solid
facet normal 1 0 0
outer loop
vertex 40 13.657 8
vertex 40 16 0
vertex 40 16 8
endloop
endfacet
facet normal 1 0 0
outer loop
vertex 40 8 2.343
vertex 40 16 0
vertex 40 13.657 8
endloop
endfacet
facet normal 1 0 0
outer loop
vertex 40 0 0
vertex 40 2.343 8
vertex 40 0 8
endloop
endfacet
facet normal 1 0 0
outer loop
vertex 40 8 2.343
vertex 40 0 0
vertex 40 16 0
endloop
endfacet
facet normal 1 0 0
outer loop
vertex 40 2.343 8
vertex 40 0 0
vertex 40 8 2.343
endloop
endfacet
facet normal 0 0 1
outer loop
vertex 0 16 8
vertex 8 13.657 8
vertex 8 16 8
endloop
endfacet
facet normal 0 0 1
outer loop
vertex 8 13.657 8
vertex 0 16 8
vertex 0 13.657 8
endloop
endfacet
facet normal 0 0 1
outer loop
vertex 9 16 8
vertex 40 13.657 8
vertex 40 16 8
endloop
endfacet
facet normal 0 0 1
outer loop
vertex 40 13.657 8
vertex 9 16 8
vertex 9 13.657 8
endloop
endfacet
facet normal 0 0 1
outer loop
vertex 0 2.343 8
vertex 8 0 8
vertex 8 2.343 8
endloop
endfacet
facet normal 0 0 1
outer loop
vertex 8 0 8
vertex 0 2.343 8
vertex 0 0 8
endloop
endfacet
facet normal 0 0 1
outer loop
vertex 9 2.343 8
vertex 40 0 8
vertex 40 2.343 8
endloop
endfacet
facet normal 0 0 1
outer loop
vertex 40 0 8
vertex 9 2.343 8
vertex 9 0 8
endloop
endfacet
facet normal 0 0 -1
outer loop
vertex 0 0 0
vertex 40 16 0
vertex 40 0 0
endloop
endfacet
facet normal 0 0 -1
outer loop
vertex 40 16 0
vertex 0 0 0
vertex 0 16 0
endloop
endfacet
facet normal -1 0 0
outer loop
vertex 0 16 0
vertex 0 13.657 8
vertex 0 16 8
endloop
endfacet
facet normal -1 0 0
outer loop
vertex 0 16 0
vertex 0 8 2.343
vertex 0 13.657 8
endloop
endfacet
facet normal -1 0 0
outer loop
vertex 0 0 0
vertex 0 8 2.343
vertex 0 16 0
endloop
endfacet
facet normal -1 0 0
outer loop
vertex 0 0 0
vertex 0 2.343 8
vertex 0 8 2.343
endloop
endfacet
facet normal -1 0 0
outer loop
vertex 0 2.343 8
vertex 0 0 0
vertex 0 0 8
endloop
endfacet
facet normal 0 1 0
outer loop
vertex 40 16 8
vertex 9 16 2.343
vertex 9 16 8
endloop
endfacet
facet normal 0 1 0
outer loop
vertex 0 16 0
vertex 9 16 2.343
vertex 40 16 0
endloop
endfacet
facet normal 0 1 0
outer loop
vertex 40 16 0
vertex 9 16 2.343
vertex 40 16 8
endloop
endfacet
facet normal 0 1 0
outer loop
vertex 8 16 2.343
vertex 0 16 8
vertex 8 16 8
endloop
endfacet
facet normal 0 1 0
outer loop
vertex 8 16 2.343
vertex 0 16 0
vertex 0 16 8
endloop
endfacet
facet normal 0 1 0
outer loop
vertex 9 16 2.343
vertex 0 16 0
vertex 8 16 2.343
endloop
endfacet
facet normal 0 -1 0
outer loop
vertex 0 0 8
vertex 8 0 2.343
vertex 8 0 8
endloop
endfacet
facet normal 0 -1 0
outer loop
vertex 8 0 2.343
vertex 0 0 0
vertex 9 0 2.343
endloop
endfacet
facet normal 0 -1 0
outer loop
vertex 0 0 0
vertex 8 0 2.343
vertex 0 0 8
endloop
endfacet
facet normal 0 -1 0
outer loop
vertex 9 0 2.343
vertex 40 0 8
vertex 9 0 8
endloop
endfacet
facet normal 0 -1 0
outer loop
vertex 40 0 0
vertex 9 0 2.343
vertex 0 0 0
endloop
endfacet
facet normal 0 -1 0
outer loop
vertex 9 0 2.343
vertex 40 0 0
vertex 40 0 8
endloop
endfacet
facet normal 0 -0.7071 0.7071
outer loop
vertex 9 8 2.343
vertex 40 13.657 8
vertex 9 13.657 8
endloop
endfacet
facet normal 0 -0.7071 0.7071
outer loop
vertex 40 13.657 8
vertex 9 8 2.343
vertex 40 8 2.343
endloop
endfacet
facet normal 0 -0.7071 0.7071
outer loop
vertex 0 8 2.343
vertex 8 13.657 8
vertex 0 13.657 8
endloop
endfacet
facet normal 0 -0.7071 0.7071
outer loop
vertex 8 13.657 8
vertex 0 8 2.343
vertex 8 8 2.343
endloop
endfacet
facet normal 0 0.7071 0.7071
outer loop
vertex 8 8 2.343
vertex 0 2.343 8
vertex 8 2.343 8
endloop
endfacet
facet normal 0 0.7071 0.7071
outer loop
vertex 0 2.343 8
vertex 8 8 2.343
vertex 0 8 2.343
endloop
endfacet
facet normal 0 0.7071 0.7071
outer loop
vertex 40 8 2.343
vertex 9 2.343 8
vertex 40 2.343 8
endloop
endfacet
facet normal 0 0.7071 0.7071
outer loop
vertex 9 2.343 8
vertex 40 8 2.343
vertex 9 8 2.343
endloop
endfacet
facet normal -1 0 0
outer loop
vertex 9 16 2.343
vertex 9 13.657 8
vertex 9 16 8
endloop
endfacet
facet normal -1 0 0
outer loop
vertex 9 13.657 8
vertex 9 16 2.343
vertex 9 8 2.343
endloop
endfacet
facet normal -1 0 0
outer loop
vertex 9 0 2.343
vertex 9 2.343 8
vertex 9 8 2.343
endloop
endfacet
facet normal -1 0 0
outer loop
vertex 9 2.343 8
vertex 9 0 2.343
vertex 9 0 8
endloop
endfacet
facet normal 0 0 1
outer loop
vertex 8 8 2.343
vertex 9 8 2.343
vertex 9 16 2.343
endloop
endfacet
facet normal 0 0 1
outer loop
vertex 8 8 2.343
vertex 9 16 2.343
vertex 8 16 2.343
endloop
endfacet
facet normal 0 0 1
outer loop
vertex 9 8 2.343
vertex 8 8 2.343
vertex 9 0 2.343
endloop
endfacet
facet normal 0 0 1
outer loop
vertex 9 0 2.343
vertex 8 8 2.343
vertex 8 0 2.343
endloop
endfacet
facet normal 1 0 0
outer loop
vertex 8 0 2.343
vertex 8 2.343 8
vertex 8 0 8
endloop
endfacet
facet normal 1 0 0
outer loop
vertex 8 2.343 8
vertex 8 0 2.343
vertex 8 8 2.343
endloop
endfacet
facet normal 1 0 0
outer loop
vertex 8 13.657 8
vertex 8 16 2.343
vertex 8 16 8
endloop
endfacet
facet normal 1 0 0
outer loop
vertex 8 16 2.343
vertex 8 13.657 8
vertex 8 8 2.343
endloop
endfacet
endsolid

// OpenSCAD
//This is my first attempt at designing something in Open SCAD
//Designed by Marek Jurek
//////////////////////////////////////////////////

//Edit the parameters below to modify the outer diameter of your tube; 
TubeDiameter=4.0;
//and length of the guide
GuideLength=TubeDiameter*10.0;
// size of the blade opening (default 1mm)
BladeOpeningWidth=1.0;
// position of the opening from the side of the guide 
BladeOpeningMargin=TubeDiameter*2;

//don't edit the code below unless you know what you're doing
BoundingSquareDiagonal=TubeDiameter*sqrt(2);
NotchHeight=BoundingSquareDiagonal;
GuideHeight=(2*NotchHeight)/sqrt(2);
GuideWidth=2*GuideHeight;

module guide()
{
	difference(){
        // base of the guide
		cube([GuideLength,GuideWidth,GuideHeight]);
        
        // horizontal notch for the tube
        translate([0,GuideWidth/2,GuideHeight-NotchHeight]) {    
            rotate(a=45, v=[1,0,0]) {
                cube([GuideLength,GuideHeight,GuideHeight]);
            }
            // you can visualize tube inside the notch
            //#tube();
        }
        
        // blade opening
        translate([BladeOpeningMargin,0,GuideHeight-NotchHeight]) {
            cube([BladeOpeningWidth,GuideWidth,GuideHeight]);
        }
	}
}

// tube for debug purposes
module tube() {
    translate([0,0,BoundingSquareDiagonal/2]) {
        rotate(a=90, v=[0,1,0]) {
            cylinder(GuideLength,d=TubeDiameter,$fs=TubeDiameter/32);
        }
    }
}

guide();
